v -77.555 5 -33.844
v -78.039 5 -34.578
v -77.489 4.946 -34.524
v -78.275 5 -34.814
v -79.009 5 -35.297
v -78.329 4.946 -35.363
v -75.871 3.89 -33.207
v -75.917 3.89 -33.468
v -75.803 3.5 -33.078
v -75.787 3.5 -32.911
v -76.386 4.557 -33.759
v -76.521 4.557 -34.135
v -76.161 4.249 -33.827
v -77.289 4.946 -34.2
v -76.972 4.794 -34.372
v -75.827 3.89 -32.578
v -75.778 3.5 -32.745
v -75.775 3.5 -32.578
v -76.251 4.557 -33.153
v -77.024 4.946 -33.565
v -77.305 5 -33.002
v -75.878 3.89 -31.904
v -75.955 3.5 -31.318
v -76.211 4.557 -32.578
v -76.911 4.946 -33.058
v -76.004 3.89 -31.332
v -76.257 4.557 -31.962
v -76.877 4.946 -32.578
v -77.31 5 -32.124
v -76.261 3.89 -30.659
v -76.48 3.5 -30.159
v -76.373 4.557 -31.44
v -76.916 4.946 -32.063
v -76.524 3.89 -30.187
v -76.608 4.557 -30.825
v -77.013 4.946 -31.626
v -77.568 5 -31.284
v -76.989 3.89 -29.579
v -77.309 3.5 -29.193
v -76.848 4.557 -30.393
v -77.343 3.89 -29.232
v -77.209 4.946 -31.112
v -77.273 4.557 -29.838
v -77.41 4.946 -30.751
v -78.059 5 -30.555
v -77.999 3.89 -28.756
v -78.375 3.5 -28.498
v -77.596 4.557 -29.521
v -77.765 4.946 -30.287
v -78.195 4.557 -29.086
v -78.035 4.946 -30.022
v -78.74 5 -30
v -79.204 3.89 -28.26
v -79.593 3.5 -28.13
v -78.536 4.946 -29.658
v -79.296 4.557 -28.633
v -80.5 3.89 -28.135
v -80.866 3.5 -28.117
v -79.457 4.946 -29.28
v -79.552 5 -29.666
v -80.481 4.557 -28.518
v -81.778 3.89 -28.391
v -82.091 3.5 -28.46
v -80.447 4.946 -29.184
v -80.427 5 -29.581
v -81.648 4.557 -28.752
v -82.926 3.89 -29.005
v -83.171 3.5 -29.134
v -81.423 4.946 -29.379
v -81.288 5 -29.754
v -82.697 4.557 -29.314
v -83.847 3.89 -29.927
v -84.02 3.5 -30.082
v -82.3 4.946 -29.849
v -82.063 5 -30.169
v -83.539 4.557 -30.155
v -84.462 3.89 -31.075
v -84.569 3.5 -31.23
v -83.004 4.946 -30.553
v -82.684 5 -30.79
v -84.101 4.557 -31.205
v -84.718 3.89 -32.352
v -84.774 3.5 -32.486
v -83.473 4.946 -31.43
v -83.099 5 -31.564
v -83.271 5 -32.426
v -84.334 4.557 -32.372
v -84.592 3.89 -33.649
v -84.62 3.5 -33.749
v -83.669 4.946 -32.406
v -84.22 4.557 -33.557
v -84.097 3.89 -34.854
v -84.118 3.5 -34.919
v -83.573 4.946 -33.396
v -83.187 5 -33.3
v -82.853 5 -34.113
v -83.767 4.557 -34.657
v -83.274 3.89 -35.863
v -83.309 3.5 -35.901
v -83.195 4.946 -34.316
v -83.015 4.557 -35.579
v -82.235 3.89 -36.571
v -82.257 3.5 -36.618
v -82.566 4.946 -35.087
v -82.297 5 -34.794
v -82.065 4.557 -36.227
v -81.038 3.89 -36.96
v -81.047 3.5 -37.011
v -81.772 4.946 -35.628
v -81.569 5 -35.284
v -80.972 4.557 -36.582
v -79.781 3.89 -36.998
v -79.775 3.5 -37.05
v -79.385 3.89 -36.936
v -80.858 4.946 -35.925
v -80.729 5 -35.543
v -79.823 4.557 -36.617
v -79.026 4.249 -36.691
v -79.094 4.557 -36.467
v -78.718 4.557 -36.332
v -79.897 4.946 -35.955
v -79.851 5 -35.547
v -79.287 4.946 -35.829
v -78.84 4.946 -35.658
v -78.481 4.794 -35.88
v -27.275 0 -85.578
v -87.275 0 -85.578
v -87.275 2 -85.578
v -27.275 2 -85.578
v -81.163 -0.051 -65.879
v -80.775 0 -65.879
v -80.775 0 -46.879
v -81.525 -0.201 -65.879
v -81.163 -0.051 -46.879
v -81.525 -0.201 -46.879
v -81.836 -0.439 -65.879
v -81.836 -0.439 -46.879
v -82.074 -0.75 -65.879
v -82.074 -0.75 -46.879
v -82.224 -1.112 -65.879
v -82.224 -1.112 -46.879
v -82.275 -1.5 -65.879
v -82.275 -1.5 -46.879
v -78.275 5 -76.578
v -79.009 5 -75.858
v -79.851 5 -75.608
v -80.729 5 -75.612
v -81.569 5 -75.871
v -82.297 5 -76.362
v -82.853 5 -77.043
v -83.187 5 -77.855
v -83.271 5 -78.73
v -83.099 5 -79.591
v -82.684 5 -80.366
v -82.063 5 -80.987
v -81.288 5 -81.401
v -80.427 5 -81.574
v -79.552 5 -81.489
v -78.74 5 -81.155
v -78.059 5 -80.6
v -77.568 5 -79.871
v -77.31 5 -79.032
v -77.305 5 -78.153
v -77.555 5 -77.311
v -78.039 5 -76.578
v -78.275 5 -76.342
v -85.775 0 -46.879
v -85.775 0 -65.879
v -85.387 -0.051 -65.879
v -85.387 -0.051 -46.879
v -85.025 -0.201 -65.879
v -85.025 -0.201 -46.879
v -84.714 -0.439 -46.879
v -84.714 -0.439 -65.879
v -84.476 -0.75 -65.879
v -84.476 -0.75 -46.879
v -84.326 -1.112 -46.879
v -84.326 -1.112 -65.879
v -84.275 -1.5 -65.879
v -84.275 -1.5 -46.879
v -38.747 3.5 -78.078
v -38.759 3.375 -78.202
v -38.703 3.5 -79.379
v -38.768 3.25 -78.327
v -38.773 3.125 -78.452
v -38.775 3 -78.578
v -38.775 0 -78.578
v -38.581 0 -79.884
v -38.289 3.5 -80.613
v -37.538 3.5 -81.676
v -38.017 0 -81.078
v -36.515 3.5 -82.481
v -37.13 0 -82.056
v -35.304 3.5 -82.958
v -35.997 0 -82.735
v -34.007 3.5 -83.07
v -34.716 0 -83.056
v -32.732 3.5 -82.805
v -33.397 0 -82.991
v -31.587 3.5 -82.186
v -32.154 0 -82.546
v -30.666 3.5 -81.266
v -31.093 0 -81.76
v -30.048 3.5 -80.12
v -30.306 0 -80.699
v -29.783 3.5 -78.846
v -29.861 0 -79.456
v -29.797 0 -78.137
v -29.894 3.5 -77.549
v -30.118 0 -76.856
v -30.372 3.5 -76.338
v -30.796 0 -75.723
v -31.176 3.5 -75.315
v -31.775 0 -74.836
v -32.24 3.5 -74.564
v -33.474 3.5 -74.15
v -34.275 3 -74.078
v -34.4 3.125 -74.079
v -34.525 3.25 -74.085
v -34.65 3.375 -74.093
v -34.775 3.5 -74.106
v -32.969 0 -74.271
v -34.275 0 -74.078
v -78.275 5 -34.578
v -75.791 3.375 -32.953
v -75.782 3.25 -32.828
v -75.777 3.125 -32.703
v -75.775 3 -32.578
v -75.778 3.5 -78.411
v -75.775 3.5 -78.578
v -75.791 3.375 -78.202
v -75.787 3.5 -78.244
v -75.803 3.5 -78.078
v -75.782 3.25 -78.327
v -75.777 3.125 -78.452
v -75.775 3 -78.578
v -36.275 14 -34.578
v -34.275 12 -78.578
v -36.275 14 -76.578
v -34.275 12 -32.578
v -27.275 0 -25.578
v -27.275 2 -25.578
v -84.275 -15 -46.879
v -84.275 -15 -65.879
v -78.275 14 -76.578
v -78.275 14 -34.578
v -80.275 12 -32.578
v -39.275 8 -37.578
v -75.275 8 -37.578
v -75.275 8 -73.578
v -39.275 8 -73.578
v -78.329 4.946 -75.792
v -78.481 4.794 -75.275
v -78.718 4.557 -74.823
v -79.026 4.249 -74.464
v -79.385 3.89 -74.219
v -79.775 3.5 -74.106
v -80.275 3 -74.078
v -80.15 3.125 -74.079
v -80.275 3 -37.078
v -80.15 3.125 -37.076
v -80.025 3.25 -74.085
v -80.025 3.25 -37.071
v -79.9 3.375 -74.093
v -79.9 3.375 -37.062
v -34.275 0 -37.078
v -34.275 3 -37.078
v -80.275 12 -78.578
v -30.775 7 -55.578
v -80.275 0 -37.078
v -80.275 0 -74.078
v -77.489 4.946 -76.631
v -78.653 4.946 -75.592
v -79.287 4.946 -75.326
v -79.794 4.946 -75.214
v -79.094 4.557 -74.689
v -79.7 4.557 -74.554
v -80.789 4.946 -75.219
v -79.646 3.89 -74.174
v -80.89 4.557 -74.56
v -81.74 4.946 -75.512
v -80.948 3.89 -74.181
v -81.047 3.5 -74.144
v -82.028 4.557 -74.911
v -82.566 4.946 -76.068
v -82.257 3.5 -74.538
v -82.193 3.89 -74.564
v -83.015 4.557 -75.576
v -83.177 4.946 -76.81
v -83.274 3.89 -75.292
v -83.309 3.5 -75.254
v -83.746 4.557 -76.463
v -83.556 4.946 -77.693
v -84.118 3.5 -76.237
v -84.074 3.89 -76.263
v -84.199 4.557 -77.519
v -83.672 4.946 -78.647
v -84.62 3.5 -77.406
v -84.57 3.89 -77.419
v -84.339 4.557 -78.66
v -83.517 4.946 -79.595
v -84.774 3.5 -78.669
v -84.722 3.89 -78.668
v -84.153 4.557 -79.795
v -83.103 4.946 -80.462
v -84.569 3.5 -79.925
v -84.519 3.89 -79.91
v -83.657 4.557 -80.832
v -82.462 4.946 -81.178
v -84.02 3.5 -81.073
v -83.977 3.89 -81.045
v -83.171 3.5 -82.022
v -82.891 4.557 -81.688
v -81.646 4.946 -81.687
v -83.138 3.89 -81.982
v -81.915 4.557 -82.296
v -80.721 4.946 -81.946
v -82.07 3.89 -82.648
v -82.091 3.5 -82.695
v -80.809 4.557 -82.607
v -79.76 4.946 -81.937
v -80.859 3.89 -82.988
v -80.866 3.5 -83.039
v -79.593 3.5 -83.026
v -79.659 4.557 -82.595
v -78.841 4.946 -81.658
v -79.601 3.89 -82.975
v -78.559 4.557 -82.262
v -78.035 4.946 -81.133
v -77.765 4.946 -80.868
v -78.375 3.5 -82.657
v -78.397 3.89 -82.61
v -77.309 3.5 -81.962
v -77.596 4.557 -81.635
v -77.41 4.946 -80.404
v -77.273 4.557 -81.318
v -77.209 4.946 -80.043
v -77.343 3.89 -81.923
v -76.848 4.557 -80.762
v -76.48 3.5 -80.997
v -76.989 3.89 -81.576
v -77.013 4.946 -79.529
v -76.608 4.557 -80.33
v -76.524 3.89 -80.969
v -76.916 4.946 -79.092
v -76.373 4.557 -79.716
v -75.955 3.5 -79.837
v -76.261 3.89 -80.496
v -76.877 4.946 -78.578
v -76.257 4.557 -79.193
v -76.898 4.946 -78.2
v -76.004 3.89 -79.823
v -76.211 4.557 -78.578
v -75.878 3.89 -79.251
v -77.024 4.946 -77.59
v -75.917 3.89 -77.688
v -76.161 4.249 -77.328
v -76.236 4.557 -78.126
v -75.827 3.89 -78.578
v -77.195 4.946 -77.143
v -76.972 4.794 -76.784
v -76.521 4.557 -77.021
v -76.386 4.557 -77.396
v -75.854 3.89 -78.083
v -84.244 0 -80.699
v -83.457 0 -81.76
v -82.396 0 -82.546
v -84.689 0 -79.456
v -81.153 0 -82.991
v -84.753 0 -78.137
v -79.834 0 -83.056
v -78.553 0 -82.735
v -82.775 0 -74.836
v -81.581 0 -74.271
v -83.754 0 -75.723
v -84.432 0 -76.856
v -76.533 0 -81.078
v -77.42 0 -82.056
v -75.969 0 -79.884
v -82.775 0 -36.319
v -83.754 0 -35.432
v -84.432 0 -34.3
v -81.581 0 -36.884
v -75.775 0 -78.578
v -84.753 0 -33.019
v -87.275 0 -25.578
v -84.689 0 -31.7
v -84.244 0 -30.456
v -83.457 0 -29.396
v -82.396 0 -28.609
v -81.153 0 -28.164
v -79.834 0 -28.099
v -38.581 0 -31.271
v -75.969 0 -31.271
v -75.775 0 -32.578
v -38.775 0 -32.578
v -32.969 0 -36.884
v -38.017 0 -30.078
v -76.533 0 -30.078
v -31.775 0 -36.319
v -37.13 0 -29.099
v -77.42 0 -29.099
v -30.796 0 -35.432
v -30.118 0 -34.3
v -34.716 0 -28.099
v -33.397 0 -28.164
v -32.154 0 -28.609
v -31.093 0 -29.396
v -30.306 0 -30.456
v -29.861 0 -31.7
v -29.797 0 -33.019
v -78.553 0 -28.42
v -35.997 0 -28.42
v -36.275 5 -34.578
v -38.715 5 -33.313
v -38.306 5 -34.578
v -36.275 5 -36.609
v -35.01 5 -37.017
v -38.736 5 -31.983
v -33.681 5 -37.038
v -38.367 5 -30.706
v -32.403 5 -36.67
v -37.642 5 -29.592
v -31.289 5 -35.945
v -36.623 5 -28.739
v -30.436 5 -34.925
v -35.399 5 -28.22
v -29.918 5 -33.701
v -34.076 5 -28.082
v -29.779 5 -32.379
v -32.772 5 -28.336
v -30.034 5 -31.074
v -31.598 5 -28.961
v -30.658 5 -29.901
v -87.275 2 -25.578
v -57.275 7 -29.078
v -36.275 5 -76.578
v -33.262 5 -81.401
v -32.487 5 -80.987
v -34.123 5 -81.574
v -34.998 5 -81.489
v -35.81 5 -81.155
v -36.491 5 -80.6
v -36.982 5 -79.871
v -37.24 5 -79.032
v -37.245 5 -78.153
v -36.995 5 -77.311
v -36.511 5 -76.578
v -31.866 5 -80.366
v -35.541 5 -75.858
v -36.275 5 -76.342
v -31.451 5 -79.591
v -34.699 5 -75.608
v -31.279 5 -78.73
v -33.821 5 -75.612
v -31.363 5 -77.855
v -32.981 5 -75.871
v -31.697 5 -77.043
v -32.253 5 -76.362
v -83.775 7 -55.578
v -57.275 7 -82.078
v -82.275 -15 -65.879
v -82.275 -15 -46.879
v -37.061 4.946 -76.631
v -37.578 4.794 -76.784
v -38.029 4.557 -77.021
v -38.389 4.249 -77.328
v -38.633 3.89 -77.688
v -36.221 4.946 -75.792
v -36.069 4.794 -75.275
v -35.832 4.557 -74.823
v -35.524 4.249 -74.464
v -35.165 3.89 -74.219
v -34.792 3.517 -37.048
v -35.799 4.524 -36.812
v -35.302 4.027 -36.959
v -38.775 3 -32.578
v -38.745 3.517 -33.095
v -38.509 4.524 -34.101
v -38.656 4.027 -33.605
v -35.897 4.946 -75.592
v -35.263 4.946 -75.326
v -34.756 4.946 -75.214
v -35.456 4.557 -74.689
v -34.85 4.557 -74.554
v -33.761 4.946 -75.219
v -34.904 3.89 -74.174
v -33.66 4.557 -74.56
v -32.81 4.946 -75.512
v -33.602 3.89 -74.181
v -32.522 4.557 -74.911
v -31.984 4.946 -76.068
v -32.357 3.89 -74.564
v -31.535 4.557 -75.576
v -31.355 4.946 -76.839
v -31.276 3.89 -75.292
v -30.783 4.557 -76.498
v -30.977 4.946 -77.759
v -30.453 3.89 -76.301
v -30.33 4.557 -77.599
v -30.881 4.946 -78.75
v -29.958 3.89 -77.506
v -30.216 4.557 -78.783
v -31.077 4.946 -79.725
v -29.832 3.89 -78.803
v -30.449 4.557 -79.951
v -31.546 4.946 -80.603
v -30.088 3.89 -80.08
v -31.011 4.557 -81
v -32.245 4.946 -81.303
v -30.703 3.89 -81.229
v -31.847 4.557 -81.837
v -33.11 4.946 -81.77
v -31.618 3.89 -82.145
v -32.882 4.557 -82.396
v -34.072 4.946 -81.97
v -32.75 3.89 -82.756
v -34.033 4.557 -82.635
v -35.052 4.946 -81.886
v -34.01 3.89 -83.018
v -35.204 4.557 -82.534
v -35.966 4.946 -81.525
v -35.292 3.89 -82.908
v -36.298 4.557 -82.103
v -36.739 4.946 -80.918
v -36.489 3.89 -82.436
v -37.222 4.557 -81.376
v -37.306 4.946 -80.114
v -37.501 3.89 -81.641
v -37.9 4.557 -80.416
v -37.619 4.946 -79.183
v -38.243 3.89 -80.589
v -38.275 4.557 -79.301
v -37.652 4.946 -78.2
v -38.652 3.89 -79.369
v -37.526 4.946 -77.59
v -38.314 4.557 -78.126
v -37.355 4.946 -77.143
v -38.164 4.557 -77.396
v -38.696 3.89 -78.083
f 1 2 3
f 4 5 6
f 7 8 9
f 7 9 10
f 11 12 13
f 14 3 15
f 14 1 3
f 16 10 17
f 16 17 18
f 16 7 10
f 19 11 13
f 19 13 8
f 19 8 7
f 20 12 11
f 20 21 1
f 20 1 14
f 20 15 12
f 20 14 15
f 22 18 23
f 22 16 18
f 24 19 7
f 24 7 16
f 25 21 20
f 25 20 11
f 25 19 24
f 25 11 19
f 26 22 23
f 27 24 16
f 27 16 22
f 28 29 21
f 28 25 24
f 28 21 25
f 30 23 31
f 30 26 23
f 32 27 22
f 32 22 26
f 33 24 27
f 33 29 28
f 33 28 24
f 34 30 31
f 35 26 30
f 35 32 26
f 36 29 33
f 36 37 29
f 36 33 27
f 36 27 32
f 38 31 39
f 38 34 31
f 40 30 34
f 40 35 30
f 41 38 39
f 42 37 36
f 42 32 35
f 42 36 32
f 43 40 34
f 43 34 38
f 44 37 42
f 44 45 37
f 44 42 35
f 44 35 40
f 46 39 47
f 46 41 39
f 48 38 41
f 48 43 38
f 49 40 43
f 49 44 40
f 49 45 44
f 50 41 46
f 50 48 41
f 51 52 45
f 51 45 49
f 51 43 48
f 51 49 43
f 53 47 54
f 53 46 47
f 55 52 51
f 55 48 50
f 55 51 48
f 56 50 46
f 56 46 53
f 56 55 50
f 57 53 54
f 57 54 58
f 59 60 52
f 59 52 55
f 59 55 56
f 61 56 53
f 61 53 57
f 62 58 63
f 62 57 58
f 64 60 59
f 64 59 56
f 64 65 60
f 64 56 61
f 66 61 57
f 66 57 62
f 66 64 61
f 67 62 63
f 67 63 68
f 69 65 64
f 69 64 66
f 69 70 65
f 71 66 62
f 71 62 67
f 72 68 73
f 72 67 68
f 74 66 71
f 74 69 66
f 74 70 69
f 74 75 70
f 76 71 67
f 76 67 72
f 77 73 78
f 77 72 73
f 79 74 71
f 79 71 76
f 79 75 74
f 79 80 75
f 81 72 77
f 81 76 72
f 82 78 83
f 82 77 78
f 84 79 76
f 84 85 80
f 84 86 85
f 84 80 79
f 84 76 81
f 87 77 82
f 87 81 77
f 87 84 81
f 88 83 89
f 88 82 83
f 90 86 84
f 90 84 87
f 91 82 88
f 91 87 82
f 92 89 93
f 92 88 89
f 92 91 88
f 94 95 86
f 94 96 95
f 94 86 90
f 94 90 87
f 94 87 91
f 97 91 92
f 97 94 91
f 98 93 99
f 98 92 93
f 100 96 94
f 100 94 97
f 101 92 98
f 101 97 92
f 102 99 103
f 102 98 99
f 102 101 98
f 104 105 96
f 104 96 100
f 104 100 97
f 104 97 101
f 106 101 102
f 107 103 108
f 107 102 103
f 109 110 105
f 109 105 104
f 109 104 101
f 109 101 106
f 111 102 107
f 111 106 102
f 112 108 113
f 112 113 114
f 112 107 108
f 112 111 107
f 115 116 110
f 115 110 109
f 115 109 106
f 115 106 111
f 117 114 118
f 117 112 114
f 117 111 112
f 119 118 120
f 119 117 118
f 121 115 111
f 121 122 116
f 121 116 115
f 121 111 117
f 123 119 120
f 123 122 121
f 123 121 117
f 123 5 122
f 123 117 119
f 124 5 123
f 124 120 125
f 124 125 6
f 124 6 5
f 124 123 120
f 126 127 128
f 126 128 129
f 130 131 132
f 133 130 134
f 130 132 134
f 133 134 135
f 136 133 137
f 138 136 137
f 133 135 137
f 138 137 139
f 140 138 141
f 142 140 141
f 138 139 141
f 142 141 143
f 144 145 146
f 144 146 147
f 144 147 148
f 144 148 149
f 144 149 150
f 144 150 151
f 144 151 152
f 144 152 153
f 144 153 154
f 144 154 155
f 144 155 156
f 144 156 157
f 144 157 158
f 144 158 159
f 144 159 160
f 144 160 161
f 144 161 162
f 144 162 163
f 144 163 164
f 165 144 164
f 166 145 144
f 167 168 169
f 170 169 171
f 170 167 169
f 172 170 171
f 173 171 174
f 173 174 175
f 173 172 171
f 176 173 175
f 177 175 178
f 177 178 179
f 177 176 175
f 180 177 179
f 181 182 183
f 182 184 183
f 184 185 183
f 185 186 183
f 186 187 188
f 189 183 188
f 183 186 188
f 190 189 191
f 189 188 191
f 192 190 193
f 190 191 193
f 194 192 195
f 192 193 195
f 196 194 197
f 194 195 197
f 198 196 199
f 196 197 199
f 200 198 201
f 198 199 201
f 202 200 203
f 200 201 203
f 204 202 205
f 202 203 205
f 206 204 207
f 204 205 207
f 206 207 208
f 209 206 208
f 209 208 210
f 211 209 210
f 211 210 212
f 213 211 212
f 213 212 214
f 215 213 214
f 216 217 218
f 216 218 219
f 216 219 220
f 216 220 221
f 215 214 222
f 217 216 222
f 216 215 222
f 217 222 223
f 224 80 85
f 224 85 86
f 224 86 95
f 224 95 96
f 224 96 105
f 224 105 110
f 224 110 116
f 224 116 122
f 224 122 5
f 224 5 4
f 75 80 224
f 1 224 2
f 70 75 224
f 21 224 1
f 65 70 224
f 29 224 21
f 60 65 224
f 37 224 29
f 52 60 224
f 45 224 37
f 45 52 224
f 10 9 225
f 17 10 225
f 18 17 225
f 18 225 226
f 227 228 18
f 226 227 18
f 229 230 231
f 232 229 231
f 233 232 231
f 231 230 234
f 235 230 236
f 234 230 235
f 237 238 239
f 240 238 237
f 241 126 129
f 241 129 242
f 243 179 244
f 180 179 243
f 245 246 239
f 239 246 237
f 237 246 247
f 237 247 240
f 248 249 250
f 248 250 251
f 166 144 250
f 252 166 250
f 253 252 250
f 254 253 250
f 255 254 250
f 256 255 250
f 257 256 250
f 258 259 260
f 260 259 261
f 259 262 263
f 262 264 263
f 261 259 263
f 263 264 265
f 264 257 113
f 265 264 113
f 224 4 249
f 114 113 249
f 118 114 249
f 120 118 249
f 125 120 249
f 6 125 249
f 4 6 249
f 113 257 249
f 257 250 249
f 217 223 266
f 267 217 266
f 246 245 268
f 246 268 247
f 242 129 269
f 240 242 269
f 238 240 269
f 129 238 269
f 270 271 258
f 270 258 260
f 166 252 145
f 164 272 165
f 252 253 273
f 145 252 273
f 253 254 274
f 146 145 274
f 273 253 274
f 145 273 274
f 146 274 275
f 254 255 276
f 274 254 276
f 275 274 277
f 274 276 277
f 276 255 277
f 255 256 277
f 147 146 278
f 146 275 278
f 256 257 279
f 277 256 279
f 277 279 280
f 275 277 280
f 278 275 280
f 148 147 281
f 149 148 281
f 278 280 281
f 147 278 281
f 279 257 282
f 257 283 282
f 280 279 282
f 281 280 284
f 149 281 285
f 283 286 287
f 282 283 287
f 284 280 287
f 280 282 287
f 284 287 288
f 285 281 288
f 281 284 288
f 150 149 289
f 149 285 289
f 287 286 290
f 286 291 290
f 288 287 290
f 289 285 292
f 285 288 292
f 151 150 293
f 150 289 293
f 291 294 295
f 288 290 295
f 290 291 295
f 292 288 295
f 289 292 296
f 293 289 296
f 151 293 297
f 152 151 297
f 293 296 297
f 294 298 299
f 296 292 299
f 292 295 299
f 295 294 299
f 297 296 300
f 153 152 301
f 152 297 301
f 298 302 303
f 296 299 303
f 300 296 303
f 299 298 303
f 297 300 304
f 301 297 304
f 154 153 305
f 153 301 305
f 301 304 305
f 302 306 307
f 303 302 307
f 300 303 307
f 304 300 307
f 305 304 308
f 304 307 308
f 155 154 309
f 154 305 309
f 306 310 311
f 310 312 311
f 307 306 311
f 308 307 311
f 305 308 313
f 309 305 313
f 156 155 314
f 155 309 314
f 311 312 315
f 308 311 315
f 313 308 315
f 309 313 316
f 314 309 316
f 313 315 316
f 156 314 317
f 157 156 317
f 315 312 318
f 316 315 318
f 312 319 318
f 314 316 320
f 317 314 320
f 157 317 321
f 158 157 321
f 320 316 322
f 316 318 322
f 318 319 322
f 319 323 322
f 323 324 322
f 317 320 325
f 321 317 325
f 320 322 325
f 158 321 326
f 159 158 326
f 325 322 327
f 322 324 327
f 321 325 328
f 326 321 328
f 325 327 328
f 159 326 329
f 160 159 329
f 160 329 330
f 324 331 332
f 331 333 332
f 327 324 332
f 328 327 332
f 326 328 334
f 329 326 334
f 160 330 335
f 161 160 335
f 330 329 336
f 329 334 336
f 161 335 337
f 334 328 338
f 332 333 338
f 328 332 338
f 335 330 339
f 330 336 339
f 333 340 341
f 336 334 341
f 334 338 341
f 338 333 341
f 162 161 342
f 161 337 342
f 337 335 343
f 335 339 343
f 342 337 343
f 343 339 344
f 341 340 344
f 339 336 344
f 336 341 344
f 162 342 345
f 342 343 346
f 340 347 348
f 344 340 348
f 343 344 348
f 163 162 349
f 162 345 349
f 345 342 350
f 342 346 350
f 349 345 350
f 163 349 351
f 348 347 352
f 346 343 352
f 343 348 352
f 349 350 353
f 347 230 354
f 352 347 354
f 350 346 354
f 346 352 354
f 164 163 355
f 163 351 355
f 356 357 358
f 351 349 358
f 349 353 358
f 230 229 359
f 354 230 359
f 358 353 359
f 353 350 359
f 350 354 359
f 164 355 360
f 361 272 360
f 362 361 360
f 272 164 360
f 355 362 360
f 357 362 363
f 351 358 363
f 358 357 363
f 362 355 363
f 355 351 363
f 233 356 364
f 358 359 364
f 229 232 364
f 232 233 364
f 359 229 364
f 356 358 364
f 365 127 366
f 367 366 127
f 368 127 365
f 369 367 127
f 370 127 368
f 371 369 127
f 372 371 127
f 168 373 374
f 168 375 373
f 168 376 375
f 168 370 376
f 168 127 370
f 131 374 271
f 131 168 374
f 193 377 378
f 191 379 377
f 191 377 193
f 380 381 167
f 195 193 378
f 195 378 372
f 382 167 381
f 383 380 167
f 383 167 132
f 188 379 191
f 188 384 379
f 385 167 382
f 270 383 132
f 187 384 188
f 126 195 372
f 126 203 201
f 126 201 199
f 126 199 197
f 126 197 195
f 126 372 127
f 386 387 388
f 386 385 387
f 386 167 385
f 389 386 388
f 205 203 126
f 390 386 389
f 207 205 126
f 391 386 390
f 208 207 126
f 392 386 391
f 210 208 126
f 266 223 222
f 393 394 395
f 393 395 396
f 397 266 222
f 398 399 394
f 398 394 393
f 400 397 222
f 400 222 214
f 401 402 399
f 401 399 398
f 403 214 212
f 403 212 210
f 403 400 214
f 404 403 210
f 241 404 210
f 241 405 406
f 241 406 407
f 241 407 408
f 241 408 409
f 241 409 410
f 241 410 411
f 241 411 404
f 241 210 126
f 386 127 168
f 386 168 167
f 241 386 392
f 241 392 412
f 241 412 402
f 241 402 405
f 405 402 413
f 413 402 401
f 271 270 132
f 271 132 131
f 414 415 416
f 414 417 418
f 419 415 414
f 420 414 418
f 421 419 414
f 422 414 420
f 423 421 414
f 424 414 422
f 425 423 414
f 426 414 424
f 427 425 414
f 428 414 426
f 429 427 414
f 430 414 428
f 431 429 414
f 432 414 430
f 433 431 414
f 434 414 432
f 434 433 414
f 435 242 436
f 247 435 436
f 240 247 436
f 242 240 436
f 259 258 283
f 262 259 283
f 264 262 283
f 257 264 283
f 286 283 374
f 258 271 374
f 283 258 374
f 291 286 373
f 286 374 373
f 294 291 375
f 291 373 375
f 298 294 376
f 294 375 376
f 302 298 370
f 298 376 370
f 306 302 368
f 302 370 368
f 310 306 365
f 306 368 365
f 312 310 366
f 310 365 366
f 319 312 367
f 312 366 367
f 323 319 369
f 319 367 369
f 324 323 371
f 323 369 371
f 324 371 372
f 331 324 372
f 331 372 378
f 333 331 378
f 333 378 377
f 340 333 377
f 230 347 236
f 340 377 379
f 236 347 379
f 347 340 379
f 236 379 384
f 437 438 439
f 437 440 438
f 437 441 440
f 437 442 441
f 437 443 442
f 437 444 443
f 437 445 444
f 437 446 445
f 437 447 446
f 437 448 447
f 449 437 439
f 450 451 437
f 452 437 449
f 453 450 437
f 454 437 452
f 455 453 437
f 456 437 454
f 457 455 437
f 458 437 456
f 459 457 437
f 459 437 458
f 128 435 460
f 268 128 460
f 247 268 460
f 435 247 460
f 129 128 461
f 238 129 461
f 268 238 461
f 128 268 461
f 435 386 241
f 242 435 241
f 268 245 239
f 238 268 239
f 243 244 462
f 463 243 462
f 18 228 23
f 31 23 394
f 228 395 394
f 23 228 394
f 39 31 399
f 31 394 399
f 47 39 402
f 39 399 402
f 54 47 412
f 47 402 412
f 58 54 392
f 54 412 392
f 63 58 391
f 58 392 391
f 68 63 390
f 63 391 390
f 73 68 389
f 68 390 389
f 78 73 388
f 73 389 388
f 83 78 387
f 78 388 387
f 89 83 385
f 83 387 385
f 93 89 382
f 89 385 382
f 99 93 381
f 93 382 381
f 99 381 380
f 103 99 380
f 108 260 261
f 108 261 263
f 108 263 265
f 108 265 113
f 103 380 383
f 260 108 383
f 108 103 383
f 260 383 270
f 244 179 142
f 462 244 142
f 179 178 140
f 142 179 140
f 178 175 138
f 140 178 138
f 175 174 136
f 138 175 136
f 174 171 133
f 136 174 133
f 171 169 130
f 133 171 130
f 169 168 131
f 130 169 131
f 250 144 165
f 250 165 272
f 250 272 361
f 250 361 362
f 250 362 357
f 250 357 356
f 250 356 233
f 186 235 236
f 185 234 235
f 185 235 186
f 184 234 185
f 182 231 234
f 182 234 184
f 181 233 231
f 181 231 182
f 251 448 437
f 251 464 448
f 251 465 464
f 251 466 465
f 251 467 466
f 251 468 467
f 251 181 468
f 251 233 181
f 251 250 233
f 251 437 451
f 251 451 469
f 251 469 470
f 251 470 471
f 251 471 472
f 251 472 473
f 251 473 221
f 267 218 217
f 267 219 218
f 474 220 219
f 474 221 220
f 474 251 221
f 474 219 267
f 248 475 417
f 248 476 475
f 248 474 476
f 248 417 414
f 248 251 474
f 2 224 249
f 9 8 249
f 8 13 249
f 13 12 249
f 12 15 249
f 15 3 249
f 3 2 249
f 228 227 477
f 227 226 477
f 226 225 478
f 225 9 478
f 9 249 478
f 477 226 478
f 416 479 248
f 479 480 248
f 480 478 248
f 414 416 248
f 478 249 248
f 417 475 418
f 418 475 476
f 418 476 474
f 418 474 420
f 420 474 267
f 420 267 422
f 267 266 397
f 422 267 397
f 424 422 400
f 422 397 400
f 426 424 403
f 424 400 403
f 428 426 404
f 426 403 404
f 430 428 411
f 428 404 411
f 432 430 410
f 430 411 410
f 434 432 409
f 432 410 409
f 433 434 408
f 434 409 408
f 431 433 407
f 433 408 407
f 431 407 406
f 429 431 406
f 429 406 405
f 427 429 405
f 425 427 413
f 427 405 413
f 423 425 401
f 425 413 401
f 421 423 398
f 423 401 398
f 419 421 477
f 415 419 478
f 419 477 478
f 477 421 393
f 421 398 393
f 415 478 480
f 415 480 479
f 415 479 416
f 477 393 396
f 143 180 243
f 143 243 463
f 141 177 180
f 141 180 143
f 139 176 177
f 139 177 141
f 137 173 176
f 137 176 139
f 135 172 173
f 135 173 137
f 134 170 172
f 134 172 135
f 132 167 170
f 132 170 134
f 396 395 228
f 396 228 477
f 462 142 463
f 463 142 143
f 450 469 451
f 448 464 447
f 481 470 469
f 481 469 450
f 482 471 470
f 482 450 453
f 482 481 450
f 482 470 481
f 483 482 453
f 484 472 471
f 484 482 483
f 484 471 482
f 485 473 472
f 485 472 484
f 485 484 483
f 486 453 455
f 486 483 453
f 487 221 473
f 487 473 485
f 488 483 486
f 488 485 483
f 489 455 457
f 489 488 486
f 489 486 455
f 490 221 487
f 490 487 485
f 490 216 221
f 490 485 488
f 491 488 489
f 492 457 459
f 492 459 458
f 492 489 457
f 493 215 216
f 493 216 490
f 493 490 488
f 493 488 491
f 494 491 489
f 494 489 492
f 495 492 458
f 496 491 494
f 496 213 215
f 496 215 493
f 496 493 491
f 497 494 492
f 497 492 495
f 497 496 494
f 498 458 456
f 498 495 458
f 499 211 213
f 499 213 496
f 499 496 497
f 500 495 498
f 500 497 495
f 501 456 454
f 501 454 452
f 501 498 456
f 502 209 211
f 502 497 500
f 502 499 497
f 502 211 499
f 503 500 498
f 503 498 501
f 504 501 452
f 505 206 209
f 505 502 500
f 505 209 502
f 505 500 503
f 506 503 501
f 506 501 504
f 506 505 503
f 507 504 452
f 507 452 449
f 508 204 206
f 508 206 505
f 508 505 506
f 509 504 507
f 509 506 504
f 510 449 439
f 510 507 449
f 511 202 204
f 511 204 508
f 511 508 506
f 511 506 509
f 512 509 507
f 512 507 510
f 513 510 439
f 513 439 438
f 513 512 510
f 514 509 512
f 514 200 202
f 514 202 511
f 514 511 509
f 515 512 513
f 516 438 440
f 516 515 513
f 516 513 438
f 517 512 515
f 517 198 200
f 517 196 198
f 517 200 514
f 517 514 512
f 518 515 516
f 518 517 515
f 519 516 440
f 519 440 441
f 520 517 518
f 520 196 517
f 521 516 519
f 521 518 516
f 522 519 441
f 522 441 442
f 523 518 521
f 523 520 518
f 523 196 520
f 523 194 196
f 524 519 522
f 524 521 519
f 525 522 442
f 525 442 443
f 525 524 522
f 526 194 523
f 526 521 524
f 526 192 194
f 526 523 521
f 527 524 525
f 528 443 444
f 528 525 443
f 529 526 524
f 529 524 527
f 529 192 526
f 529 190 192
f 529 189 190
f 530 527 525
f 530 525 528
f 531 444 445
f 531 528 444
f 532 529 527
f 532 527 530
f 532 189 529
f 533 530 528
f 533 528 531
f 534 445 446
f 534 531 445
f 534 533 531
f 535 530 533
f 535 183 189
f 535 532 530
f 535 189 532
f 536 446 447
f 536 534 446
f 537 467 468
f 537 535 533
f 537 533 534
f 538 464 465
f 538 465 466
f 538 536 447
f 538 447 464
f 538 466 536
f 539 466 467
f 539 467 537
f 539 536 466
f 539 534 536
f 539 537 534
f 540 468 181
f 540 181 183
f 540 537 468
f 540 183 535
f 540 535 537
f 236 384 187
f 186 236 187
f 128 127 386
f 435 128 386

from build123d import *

# Parameters (mm, degrees)
SKETCH1_W           = 60
SKETCH1_H           = 60
BOSS_EXTRUDE1_DEPTH = 2
BOSS_EXTRUDE2_START = -12
SKETCH1_18_W        = 46
SKETCH1_18_H        = 46
BOSS_EXTRUDE2_DEPTH = 2
CHAMFER1_SIZE       = 2
SKETCH1_19_W        = 46
SKETCH1_19_H        = 46
CUT_EXTRUDE4_DEPTH  = 8
CHAMFER2_SIZE       = 5
SKETCH1_21_R        = 4.5
CUT_EXTRUDE5_DEPTH  = 5
FILLET1_R           = 1.5
SKETCH1_22_W        = 2
SKETCH1_22_H        = 19
BOSS_EXTRUDE3_DEPTH = 15
FILLET2_R           = 1.5


with BuildPart() as part:
    # Sketch1 → Boss-Extrude1 (new body)
    with BuildSketch(Plane.XZ):
        with Locations((-57.275008644, -55.577648407)):
            Rectangle(SKETCH1_W, SKETCH1_H)
    extrude(amount=-BOSS_EXTRUDE1_DEPTH)



with BuildPart() as body_2:
    # Sketch1<18> → Boss-Extrude2 (new body)
    with BuildSketch(Plane.XZ.offset(BOSS_EXTRUDE2_START)):
        with Locations((-57.275008644, -55.577648407)):
            Rectangle(SKETCH1_18_W, SKETCH1_18_H)
    extrude(amount=-BOSS_EXTRUDE2_DEPTH)


with BuildPart() as part_1:
    add(part.part)

    add(body_2.part)  # loft1 joins it to this body
    # loft from a face of the part (loft1)
    loft([part_1.faces().sort_by_distance((-57.275008644, 2, -55.577648407))[0], part_1.faces().sort_by_distance((-57.275008644, 12, -55.577648407))[0]])

    # Chamfer1
    chamfer1_edges = [part_1.edges().sort_by_distance(p)[0] for p in [
        (-57.275008644, 14, -32.577648407),
        (-34.275008644, 14, -55.577648407),
        (-57.275008644, 14, -78.577648407),
        (-80.275008644, 14, -55.577648407),
    ]]
    chamfer(chamfer1_edges, length=CHAMFER1_SIZE - 0.0001)  # a hair under: the kernel refuses the full size

    # Sketch1<19> → Cut-Extrude4 (cut)
    with BuildSketch(Plane.XZ):
        with Locations((-57.275008644, -55.577648407)):
            Rectangle(SKETCH1_19_W, SKETCH1_19_H)
    extrude(amount=-CUT_EXTRUDE4_DEPTH, mode=Mode.SUBTRACT)

    # Chamfer2
    chamfer2_edges = [part_1.edges().sort_by_distance(p)[0] for p in [
        (-57.275008644, 8, -32.577648407),
        (-80.275008644, 8, -55.577648407),
        (-34.275008644, 8, -55.577648407),
        (-57.275008644, 8, -78.577648407),
    ]]
    chamfer(chamfer2_edges, length=CHAMFER2_SIZE)

    # Sketch1<21> → Cut-Extrude5 (cut)
    with BuildSketch(Plane.XZ):
        with Locations((-34.275008644, -32.577648407)):
            Circle(SKETCH1_21_R)
        with Locations((-80.275008644, -32.577648407)):
            Circle(SKETCH1_21_R)
        with Locations((-80.275008644, -78.577648407)):
            Circle(SKETCH1_21_R)
        with Locations((-34.275008644, -78.577648407)):
            Circle(SKETCH1_21_R)
    extrude(amount=-CUT_EXTRUDE5_DEPTH, mode=Mode.SUBTRACT)

    # Fillet1
    fillet1_edges = [part_1.edges().sort_by_distance(p)[0] for p in [
        (-83.45698916, 5, -81.759628922),
        (-83.45698916, 5, -29.395667891),
        (-31.093028129, 5, -81.759628922),
    ]]
    fillet(fillet1_edges, radius=FILLET1_R)

    # Sketch1<22> → Boss-Extrude3 (add)
    with BuildSketch(Plane.XZ):
        with Locations((-83.275008644, -56.378641634)):
            Rectangle(SKETCH1_22_W, SKETCH1_22_H)
    extrude(amount=BOSS_EXTRUDE3_DEPTH)

    # Fillet2
    fillet2_edges = [part_1.edges().sort_by_distance(p)[0] for p in [
        (-84.275008644, 0, -56.378641634),
        (-82.275008644, 0, -56.378641634),
    ]]
    fillet(fillet2_edges, radius=FILLET2_R)


solid = part_1.part
